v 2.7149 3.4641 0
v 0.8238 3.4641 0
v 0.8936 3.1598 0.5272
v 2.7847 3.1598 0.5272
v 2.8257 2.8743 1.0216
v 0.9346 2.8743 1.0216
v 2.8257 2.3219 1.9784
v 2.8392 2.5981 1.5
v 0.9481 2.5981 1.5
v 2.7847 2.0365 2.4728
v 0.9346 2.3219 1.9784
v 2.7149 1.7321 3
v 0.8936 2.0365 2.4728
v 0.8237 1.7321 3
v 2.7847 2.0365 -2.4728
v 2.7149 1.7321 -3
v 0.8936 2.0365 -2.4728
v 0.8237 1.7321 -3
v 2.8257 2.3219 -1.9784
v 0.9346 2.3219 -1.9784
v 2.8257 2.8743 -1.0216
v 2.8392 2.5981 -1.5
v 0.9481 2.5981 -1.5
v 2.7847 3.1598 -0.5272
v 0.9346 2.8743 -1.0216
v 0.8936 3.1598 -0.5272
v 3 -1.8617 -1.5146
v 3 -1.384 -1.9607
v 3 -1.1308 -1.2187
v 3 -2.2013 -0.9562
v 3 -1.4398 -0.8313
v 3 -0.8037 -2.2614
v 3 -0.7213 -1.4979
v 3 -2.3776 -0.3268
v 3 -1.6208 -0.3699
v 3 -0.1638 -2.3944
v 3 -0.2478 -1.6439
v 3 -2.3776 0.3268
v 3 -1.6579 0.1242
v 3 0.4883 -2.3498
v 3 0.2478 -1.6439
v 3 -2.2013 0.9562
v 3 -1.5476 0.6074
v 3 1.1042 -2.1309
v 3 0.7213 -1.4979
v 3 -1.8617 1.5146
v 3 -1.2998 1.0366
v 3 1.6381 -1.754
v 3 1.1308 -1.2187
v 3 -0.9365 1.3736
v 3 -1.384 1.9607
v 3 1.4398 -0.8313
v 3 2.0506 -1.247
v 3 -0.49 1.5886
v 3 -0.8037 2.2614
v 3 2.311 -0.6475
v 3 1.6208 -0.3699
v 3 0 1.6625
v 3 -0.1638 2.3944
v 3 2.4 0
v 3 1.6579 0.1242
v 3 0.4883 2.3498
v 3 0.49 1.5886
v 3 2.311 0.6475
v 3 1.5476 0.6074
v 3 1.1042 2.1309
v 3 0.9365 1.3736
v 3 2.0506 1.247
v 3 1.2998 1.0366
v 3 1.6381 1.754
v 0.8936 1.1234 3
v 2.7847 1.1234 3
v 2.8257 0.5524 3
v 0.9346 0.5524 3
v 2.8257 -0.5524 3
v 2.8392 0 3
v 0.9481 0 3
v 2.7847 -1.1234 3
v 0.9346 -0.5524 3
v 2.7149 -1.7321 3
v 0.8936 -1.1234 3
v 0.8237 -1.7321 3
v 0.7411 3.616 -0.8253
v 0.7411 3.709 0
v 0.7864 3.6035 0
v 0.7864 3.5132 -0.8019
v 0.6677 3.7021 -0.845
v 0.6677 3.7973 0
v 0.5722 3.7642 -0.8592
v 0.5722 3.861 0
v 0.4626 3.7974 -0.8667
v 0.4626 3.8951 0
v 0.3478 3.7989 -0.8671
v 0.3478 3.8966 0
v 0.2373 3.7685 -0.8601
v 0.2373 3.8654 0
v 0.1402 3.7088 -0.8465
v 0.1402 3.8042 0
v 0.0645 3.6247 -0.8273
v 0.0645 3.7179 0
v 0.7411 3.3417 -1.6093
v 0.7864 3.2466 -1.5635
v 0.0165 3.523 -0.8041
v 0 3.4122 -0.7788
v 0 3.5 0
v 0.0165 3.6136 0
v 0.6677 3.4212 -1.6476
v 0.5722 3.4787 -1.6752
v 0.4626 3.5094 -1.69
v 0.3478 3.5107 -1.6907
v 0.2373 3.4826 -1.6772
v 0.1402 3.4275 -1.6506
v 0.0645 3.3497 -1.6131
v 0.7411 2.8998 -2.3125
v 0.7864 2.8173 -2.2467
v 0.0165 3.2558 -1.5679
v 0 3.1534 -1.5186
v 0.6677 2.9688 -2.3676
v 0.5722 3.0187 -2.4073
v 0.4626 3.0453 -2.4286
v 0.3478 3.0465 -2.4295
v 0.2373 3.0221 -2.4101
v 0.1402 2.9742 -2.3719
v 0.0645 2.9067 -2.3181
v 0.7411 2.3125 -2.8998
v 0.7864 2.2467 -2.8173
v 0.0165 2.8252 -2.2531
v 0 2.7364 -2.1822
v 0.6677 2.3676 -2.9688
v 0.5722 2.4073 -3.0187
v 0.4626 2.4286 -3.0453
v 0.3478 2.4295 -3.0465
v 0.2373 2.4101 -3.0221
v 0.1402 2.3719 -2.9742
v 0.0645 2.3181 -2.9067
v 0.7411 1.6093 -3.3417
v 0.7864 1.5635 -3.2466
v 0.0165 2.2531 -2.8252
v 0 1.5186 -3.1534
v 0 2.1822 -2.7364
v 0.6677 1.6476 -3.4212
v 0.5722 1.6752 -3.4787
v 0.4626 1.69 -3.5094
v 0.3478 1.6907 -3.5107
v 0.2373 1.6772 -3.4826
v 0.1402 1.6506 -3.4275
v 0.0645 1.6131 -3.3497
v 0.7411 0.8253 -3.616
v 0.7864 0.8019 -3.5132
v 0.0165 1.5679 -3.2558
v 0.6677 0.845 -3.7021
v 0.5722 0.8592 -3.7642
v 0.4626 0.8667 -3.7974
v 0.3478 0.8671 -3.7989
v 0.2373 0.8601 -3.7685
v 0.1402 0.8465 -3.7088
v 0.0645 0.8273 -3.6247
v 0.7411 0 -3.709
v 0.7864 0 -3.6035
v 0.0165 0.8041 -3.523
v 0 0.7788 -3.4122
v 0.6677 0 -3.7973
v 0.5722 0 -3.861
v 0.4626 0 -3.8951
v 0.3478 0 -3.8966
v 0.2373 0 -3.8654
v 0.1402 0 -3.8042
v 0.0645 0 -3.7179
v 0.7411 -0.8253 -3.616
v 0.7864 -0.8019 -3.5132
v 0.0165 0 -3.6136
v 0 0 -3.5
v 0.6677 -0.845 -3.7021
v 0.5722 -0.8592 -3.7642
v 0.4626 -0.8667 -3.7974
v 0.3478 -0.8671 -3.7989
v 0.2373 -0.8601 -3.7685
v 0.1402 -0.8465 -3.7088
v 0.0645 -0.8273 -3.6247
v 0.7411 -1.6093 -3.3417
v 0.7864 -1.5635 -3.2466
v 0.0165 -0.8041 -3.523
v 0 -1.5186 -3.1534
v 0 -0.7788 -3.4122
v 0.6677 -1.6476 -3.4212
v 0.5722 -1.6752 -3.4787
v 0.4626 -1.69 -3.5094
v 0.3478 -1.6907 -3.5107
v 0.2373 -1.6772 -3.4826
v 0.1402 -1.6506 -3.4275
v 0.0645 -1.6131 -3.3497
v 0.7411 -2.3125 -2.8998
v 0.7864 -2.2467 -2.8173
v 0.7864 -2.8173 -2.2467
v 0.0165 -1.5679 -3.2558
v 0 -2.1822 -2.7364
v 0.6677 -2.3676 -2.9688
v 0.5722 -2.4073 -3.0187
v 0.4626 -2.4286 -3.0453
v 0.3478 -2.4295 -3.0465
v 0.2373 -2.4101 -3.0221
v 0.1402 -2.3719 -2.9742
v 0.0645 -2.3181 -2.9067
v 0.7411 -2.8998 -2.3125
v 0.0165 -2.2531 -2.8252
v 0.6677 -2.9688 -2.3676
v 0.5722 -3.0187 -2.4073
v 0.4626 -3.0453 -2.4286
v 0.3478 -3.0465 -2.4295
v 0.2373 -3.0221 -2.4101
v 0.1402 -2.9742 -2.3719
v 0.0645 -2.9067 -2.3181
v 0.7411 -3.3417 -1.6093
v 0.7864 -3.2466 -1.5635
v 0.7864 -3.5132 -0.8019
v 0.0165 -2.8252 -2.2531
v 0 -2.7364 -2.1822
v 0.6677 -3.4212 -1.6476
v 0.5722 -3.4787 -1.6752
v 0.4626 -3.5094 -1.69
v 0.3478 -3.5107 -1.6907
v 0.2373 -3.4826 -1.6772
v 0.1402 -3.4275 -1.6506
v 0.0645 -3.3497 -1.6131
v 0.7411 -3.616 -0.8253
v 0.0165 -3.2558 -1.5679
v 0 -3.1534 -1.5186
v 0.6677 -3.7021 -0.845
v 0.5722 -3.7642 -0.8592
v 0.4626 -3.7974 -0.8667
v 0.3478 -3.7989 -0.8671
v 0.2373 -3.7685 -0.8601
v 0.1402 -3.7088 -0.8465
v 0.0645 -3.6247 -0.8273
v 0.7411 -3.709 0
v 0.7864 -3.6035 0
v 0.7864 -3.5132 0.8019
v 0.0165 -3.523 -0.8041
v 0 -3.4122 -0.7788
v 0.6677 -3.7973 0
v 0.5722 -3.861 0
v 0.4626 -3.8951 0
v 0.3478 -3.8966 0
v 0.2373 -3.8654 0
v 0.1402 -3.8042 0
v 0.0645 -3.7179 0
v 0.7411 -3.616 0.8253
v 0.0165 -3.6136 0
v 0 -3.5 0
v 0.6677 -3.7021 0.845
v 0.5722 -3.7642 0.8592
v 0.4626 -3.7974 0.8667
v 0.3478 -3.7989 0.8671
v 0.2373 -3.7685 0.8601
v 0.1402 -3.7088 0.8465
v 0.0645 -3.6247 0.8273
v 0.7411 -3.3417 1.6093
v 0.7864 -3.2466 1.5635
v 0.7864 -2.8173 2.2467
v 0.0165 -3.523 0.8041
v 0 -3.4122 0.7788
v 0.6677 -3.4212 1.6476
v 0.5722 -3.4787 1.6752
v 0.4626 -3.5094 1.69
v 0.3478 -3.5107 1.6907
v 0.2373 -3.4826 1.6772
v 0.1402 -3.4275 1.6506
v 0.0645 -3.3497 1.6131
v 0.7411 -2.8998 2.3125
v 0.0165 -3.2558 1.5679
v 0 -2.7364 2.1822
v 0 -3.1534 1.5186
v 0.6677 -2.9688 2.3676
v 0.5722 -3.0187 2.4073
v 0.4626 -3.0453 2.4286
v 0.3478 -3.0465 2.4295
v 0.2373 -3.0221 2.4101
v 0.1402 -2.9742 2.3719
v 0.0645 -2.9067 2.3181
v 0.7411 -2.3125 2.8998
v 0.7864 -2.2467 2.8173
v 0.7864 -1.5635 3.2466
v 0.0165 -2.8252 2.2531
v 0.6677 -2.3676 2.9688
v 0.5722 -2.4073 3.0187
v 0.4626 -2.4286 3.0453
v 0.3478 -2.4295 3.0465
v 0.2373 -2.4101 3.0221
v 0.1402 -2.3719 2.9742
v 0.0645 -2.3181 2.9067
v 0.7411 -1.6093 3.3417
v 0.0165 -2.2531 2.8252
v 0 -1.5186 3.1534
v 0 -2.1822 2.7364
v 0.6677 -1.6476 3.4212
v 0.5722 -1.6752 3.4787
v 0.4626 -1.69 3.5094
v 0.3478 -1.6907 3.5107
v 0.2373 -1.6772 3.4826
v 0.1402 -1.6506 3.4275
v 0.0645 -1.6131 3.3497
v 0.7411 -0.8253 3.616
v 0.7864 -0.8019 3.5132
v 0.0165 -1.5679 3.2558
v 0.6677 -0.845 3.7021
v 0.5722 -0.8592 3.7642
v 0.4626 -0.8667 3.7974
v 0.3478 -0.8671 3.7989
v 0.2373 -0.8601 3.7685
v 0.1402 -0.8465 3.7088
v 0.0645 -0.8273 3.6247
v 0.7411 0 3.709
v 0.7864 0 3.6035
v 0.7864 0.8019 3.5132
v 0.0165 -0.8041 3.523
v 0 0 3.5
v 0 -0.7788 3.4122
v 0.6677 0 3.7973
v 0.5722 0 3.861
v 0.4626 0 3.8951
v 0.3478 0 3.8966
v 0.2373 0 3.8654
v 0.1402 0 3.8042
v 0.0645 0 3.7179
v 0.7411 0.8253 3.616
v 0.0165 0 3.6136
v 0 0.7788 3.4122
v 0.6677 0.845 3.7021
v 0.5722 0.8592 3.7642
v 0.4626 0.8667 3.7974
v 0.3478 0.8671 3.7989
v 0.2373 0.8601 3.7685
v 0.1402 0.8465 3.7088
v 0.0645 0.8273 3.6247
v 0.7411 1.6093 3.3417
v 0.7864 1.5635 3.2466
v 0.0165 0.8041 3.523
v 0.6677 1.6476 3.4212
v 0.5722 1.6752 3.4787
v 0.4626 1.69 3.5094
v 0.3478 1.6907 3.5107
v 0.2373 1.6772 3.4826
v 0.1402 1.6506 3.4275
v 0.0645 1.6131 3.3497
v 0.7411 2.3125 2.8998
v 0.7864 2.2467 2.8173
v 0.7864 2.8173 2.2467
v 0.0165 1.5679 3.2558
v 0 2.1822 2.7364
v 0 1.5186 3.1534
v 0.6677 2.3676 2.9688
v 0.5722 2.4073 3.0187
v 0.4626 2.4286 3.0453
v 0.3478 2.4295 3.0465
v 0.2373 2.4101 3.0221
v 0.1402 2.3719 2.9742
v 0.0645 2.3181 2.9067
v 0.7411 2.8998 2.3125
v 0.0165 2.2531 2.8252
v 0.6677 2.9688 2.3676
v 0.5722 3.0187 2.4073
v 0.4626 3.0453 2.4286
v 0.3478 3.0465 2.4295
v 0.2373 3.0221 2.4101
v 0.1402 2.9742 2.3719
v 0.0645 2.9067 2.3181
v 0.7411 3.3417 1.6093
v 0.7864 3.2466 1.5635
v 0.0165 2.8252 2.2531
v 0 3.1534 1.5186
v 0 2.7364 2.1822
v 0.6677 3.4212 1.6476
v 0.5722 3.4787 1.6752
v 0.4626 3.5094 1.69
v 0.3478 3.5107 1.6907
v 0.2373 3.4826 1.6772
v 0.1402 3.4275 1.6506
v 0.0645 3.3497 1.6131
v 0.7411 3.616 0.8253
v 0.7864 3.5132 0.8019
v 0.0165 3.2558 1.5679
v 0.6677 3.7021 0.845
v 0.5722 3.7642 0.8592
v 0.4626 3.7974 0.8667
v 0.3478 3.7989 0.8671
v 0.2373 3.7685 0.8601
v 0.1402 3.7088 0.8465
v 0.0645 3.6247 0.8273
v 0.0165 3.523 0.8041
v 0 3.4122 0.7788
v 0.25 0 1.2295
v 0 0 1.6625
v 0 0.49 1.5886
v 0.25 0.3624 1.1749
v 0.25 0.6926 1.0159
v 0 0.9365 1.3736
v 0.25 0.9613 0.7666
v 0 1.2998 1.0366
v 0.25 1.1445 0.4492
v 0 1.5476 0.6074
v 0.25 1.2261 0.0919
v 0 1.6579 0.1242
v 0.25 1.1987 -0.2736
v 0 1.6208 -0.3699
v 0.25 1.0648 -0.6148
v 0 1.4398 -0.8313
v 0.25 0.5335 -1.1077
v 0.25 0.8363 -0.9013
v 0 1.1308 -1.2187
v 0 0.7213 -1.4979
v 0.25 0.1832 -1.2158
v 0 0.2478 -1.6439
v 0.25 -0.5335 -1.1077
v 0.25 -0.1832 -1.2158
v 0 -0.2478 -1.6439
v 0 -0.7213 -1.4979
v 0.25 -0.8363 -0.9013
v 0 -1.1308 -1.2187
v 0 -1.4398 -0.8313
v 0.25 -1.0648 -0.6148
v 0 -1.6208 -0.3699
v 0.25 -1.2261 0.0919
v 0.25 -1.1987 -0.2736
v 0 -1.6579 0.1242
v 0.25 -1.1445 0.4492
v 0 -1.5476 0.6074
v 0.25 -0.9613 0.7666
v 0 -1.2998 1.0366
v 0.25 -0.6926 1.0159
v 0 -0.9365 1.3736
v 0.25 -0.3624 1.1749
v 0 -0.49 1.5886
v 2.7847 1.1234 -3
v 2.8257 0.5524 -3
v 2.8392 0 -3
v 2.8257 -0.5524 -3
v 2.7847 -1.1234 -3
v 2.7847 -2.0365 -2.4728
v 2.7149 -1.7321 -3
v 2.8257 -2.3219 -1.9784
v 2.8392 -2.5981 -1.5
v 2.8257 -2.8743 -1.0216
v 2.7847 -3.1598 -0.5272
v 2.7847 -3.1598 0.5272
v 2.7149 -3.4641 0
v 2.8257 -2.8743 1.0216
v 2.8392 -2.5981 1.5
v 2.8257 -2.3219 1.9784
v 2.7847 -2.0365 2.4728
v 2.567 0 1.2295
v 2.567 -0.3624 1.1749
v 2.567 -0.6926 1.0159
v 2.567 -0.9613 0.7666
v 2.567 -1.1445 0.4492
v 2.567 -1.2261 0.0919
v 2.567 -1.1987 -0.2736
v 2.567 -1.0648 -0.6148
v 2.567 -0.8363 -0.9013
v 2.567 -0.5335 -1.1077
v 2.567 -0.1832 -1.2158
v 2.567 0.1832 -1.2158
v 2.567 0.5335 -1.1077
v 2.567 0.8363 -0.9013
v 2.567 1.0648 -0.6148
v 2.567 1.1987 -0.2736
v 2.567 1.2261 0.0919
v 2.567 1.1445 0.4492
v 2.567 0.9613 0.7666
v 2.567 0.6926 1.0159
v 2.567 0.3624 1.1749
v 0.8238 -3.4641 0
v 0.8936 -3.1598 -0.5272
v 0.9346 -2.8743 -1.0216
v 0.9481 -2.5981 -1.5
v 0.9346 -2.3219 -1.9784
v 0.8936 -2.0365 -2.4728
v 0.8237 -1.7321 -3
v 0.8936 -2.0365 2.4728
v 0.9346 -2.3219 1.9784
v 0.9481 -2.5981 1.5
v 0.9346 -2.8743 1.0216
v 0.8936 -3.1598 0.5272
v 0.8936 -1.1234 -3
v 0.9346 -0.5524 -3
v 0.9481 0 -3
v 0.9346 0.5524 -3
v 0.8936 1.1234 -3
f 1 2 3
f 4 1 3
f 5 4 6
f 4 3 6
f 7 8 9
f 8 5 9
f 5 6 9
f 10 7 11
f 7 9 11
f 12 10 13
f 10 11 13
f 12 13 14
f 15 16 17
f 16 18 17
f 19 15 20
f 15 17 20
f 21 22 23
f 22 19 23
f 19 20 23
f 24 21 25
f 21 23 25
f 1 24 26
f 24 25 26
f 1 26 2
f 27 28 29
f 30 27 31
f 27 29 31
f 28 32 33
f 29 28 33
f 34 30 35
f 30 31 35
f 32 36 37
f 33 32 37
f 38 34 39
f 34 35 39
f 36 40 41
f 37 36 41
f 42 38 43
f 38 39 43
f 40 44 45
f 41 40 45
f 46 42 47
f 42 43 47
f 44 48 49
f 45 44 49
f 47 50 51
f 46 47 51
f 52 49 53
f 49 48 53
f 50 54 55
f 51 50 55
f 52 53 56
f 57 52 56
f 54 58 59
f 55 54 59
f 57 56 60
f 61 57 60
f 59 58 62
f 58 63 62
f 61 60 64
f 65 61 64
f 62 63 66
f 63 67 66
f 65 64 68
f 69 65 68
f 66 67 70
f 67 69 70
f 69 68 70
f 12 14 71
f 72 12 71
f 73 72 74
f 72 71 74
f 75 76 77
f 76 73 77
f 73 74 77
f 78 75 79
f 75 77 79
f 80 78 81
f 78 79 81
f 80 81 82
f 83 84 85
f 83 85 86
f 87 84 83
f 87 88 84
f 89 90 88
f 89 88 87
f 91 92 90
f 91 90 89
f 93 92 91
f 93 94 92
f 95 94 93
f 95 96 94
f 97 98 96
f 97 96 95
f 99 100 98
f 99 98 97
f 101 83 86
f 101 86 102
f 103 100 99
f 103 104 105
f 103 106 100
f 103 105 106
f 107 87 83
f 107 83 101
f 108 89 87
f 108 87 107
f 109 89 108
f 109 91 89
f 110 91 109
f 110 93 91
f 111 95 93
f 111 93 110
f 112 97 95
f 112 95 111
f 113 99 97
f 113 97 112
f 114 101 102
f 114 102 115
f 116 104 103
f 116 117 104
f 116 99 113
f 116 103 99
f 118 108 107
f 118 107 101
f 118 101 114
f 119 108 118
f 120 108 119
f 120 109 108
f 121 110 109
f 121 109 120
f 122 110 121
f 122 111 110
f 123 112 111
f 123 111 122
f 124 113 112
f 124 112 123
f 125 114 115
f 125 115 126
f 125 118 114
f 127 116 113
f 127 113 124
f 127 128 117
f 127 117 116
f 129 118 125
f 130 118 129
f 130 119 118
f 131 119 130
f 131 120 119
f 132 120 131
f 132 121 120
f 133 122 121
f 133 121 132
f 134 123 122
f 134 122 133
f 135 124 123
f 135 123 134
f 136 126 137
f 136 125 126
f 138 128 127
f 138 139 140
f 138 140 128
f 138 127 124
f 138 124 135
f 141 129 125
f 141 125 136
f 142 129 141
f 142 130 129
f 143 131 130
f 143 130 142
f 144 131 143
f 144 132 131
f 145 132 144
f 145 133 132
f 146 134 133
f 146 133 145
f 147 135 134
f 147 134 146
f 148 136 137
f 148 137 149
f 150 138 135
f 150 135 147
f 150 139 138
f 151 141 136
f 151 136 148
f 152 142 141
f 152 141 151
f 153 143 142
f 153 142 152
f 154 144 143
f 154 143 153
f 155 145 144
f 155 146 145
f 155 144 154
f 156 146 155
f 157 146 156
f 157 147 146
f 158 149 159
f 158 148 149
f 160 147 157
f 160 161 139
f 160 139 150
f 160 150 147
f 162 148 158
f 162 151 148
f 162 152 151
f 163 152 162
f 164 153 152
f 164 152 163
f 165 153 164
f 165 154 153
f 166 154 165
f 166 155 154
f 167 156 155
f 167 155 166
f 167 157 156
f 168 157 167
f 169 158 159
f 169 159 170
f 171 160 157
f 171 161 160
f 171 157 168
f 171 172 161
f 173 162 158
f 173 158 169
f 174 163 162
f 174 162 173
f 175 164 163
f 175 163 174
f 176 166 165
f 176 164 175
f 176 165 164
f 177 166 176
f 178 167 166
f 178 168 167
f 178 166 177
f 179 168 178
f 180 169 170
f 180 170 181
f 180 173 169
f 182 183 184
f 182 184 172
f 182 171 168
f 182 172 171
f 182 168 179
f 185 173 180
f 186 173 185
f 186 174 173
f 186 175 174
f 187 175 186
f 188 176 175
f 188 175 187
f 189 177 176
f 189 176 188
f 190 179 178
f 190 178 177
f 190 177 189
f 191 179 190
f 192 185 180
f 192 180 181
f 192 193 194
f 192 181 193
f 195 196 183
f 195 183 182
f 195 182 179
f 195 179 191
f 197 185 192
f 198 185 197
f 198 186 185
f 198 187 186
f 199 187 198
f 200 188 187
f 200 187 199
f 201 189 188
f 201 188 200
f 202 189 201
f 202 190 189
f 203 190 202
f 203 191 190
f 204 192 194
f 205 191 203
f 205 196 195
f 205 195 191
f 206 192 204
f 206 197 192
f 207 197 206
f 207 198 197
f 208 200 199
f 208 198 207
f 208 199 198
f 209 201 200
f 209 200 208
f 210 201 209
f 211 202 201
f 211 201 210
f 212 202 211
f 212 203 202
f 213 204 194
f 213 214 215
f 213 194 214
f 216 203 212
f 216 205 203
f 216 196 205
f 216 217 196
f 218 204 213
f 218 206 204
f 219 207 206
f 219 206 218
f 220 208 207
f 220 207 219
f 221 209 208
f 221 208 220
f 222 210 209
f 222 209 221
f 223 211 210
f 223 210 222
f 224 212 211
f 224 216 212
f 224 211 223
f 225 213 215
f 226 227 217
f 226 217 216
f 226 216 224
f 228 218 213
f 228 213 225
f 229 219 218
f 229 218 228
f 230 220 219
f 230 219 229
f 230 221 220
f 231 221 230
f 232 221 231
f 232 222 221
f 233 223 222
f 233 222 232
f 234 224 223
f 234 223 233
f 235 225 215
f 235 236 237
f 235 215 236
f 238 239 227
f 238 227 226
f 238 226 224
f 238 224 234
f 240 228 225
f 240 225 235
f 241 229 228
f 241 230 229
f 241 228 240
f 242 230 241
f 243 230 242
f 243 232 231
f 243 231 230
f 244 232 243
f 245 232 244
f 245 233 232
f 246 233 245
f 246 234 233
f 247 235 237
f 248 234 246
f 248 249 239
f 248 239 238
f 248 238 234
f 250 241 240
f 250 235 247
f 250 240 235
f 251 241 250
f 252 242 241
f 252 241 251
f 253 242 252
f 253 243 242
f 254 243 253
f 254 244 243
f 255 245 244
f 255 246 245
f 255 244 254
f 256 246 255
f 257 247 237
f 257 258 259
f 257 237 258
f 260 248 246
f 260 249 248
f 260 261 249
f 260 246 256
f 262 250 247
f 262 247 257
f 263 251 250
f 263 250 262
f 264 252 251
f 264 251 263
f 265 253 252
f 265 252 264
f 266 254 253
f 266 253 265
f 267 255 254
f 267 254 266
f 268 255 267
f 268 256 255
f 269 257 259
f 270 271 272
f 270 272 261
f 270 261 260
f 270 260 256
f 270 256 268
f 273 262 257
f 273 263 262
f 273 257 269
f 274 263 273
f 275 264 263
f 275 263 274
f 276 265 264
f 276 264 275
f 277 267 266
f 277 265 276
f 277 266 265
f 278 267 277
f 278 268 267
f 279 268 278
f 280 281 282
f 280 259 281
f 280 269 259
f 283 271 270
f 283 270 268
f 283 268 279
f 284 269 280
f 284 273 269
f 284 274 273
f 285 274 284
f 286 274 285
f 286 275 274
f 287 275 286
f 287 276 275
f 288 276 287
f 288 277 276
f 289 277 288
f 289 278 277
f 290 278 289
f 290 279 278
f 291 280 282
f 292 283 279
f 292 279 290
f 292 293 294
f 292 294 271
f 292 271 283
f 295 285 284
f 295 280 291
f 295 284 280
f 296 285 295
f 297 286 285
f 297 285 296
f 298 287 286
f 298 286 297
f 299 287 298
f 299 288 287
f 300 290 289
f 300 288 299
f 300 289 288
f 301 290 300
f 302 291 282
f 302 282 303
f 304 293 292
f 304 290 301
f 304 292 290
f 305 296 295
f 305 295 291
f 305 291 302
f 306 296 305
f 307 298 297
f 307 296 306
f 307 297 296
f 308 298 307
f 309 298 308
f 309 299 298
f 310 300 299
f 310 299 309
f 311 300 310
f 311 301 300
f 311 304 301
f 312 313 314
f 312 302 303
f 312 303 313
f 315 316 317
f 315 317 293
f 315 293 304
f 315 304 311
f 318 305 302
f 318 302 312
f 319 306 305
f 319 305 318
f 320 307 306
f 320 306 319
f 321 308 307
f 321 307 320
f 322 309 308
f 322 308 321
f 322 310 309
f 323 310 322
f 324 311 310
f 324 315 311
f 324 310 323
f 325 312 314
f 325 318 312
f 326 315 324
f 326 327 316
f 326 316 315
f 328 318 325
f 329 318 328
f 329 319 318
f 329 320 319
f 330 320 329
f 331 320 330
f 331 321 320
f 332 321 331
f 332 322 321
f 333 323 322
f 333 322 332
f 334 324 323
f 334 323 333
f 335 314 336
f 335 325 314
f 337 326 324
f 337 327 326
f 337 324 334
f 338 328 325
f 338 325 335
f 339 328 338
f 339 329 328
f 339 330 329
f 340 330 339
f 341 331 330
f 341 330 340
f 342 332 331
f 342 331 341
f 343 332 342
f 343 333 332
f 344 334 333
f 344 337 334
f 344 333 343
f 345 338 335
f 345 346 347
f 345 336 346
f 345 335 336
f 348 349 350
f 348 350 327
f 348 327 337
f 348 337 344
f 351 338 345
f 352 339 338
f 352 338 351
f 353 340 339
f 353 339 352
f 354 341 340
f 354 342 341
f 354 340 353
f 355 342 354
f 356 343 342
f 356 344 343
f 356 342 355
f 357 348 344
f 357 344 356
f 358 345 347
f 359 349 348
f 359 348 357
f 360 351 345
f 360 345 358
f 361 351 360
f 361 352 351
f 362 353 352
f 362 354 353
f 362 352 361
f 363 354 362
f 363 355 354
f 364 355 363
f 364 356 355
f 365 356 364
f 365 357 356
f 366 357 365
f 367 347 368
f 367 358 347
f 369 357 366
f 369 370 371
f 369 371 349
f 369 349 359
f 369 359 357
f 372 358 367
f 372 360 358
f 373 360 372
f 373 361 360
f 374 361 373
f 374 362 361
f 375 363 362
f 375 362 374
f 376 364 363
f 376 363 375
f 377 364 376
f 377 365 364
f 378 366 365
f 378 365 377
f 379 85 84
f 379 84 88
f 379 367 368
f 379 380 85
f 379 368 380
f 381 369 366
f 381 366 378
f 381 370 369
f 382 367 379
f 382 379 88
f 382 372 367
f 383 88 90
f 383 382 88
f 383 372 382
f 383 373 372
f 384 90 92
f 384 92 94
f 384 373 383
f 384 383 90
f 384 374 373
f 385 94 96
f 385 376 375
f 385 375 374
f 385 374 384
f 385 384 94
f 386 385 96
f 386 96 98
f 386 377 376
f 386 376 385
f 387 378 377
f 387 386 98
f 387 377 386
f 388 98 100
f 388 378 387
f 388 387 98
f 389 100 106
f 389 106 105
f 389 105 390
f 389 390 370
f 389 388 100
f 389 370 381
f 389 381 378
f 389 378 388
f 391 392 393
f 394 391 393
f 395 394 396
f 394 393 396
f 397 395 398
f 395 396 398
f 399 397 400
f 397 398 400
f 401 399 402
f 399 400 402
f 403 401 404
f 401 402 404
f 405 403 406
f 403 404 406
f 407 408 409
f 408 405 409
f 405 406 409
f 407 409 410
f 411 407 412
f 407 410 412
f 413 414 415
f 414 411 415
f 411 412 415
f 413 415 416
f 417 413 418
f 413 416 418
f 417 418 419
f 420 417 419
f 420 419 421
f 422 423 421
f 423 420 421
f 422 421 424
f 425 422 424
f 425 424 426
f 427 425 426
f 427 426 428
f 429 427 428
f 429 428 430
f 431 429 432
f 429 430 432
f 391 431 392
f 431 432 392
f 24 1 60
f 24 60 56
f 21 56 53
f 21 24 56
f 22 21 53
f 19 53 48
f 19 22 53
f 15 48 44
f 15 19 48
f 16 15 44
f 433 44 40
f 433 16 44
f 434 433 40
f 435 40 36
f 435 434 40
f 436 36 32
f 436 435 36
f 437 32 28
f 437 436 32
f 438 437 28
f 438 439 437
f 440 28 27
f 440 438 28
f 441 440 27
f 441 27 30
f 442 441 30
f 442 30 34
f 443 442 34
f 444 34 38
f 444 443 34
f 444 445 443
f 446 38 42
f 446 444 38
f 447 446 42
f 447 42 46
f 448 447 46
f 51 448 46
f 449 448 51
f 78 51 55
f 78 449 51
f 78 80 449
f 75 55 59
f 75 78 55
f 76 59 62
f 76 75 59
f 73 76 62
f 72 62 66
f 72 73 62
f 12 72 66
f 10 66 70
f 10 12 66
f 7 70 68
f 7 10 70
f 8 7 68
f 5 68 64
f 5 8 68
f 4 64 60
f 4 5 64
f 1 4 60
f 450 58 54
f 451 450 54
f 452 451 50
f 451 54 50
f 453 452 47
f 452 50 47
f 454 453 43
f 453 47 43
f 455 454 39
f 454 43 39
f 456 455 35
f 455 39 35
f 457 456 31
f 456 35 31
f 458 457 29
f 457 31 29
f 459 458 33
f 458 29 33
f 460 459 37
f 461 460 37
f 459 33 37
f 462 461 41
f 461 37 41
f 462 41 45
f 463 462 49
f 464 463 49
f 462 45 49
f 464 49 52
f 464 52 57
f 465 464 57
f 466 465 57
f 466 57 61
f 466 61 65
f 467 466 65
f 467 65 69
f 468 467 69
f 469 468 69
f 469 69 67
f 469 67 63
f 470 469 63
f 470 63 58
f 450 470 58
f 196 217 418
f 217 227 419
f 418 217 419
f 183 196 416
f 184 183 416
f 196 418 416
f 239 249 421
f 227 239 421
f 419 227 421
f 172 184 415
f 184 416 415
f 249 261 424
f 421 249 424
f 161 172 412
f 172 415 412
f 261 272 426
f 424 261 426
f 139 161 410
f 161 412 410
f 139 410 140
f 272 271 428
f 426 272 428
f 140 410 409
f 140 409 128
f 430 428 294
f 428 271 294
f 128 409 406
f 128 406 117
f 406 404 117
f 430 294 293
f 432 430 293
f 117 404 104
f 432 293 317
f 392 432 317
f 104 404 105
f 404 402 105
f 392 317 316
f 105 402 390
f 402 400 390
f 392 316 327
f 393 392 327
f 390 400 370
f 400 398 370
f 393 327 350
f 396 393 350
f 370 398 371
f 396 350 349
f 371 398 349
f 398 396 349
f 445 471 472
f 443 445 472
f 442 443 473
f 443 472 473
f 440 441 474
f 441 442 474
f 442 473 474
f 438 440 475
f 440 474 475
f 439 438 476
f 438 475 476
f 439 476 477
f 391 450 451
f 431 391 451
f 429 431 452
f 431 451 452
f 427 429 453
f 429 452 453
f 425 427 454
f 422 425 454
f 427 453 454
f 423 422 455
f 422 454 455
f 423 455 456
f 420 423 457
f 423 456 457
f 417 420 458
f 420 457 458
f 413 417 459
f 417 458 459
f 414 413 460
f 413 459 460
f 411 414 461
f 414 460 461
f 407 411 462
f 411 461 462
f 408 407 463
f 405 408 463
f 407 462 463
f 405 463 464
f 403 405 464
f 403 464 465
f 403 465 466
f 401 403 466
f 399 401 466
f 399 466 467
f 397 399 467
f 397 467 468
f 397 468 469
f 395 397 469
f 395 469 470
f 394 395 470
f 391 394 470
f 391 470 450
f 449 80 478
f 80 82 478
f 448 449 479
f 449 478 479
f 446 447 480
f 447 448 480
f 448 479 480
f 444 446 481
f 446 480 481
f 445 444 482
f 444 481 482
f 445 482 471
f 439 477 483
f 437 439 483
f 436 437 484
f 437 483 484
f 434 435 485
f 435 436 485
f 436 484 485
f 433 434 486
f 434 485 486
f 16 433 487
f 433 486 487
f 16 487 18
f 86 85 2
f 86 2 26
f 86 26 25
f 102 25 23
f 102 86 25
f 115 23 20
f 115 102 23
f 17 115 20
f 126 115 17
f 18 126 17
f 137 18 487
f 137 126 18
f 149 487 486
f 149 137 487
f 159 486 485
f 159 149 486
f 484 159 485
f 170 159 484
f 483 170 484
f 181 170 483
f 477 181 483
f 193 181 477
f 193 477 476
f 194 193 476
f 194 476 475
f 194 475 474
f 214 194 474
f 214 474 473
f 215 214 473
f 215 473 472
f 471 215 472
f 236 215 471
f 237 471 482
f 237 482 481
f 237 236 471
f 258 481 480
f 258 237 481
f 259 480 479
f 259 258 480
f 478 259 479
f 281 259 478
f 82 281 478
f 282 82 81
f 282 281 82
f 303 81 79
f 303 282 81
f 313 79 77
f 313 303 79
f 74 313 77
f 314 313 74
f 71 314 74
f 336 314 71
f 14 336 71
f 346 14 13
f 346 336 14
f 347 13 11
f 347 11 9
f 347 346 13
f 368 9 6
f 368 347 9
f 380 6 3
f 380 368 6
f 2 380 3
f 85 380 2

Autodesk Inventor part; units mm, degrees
ref_plane "YZ Plane" through (0, 0, 0) normal (1, 0, 0) x (0, 1, 0)
ref_plane "XZ Plane" through (0, 0, 0) normal (0, 1, 0) x (-1, 0, 0)
sketch "Skizze1" plane through (0, 0, 0) normal (0, 0, 1) x (1, 0, 0)
  line L0 (-0.8145, 0) -> (4.5691, 0) projected
  line L1 (1.1089, 2.4) -> (0.7864, 3.6035)
  line L2 (1.1089, 2.4) -> (3.8, 2.4) construction
  line L3 (3.8, 2.4) -> (3.8, 0) construction
  arc A0 (0.7864, 3.6035) -> (0, 3.5) centre (0.4, 3.5) ccw
  line L4 (1.1089, 2.4) -> (1.1089, 0)
  line L5 (0, -0.7897) -> (0, 4.738) projected
  point P0 (0, 0)
  dimension "d2" = 4.8
  dimension "d4" = 7.8
  dimension "d5" = 0.4
  dimension "d15" = 3.8
  dimension "d16" = 15
revolve "Ring" add sketch "Skizze1" angle 360 about axis through (-10, 0, 0) along (1, 0, 0)
sketch "Skizze2" plane through (0, 0, 0) normal (-1, 0, 0) x (0, 0, 1)
  circle A0 centre (0, 0) radius 4.9
  line L0 (-3, -1.7321) -> (-3, 1.7321)
  line L1 (-3, 1.7321) -> (0, 3.4641)
  line L2 (0, 3.4641) -> (3, 1.7321)
  line L3 (3, 1.7321) -> (3, -1.7321)
  line L4 (3, -1.7321) -> (0, -3.4641)
  line L5 (0, -3.4641) -> (-3, -1.7321)
  dimension "d55" = 6
extrude "Körper" add sketch "Skizze2" against normal blind 3 contours L0 L1 L2 L3 L4 L5
sketch "Skizze3" plane through (0, 0, 0) normal (0, 0, 1) x (1, 0, 0)
  line L0 (0.8237, 3.4641) -> (3, 3.4641) projected
  line L1 (3, 1.7321) -> (3, 3.4641) projected
  line L2 (0, -3.5) -> (0, 3.5) projected
  line L3 (-0.6, 0) -> (3.6, 0) projected
  line L4 (2.7149, 3.4641) -> (3, 2.4)
  dimension "d10" = 15
  dimension "d11" = 4.8
revolve "Fase1" cut sketch "Skizze3" angle 360 about axis through (-10, 0, 0) along (1, 0, 0)
sketch "Skizze4" plane through (0, 0, 0) normal (-1, 0, 0) x (0, 0, 1)
  circle A0 centre (0, 0) radius 3.5 projected
hole "Gewinde" at (0, 0, 0) direction (1, 0, 0) diameter 2.459 end through all thread size "M3x0.5" class "6H" standard "ISO Metric profile"
chamfer "Fase2" distance 0.433 angle 30 1 edges at (0, 0, -1.2295) measured on face at (0, 2.7063, -0.3286)
ref_plane "Work Plane1" through (11.4315, 0, 0) normal (0, 0, -1) x (-1, 0, 0)
chamfer "Fase3" distance 0.433 angle 45 1 edges at (3, 0, -1.2295)
equation "\"d2\" = 0.6 * SW"
equation "\"d16\" = 0.6 * KEWI"
equation "\"d7\" = 0.6 * KOH"
equation "\"d10\" = ANG1"
equation "\"d11\" = 0.6 * SW0"
equation "\"d12\" = -0.5 * GD1 + 0.5 * NND"
equation "\"d46\" = -0.5 * GD1 + 0.5 * NND"
equation "\"d51\" = -0.5 * GD1 + 0.5 * NND"
equation "\"ANG1\" = 15deg"
equation "\"KEWI\" = 25deg"
equation "\"NND\" = 5"
equation "\"LADI\" = 11.8"
equation "\"SW\" = 8"
equation "\"PHH\" = RR"
equation "\"KOH\" = NND"
equation "\"SW0\" = SW"
equation "\"d1\" = LADI"
equation "\"d3\" = PHH"
equation "\"GUL\" = 0.541266 * PTC"
equation "\"RR\" = 1"
equation "\"THREADDIA\" = 5"
equation "\"TOA\" = 30deg"
equation "\"PTC\" = 0.8"
equation "\"GAL\" = 0.541266 * PTC"
equation "\"E0\" = 1.155 * SW"
equation "\"GD1\" = 4.133975"
properties part number "DIN 6923 - M5" material "Stahl, weich"
